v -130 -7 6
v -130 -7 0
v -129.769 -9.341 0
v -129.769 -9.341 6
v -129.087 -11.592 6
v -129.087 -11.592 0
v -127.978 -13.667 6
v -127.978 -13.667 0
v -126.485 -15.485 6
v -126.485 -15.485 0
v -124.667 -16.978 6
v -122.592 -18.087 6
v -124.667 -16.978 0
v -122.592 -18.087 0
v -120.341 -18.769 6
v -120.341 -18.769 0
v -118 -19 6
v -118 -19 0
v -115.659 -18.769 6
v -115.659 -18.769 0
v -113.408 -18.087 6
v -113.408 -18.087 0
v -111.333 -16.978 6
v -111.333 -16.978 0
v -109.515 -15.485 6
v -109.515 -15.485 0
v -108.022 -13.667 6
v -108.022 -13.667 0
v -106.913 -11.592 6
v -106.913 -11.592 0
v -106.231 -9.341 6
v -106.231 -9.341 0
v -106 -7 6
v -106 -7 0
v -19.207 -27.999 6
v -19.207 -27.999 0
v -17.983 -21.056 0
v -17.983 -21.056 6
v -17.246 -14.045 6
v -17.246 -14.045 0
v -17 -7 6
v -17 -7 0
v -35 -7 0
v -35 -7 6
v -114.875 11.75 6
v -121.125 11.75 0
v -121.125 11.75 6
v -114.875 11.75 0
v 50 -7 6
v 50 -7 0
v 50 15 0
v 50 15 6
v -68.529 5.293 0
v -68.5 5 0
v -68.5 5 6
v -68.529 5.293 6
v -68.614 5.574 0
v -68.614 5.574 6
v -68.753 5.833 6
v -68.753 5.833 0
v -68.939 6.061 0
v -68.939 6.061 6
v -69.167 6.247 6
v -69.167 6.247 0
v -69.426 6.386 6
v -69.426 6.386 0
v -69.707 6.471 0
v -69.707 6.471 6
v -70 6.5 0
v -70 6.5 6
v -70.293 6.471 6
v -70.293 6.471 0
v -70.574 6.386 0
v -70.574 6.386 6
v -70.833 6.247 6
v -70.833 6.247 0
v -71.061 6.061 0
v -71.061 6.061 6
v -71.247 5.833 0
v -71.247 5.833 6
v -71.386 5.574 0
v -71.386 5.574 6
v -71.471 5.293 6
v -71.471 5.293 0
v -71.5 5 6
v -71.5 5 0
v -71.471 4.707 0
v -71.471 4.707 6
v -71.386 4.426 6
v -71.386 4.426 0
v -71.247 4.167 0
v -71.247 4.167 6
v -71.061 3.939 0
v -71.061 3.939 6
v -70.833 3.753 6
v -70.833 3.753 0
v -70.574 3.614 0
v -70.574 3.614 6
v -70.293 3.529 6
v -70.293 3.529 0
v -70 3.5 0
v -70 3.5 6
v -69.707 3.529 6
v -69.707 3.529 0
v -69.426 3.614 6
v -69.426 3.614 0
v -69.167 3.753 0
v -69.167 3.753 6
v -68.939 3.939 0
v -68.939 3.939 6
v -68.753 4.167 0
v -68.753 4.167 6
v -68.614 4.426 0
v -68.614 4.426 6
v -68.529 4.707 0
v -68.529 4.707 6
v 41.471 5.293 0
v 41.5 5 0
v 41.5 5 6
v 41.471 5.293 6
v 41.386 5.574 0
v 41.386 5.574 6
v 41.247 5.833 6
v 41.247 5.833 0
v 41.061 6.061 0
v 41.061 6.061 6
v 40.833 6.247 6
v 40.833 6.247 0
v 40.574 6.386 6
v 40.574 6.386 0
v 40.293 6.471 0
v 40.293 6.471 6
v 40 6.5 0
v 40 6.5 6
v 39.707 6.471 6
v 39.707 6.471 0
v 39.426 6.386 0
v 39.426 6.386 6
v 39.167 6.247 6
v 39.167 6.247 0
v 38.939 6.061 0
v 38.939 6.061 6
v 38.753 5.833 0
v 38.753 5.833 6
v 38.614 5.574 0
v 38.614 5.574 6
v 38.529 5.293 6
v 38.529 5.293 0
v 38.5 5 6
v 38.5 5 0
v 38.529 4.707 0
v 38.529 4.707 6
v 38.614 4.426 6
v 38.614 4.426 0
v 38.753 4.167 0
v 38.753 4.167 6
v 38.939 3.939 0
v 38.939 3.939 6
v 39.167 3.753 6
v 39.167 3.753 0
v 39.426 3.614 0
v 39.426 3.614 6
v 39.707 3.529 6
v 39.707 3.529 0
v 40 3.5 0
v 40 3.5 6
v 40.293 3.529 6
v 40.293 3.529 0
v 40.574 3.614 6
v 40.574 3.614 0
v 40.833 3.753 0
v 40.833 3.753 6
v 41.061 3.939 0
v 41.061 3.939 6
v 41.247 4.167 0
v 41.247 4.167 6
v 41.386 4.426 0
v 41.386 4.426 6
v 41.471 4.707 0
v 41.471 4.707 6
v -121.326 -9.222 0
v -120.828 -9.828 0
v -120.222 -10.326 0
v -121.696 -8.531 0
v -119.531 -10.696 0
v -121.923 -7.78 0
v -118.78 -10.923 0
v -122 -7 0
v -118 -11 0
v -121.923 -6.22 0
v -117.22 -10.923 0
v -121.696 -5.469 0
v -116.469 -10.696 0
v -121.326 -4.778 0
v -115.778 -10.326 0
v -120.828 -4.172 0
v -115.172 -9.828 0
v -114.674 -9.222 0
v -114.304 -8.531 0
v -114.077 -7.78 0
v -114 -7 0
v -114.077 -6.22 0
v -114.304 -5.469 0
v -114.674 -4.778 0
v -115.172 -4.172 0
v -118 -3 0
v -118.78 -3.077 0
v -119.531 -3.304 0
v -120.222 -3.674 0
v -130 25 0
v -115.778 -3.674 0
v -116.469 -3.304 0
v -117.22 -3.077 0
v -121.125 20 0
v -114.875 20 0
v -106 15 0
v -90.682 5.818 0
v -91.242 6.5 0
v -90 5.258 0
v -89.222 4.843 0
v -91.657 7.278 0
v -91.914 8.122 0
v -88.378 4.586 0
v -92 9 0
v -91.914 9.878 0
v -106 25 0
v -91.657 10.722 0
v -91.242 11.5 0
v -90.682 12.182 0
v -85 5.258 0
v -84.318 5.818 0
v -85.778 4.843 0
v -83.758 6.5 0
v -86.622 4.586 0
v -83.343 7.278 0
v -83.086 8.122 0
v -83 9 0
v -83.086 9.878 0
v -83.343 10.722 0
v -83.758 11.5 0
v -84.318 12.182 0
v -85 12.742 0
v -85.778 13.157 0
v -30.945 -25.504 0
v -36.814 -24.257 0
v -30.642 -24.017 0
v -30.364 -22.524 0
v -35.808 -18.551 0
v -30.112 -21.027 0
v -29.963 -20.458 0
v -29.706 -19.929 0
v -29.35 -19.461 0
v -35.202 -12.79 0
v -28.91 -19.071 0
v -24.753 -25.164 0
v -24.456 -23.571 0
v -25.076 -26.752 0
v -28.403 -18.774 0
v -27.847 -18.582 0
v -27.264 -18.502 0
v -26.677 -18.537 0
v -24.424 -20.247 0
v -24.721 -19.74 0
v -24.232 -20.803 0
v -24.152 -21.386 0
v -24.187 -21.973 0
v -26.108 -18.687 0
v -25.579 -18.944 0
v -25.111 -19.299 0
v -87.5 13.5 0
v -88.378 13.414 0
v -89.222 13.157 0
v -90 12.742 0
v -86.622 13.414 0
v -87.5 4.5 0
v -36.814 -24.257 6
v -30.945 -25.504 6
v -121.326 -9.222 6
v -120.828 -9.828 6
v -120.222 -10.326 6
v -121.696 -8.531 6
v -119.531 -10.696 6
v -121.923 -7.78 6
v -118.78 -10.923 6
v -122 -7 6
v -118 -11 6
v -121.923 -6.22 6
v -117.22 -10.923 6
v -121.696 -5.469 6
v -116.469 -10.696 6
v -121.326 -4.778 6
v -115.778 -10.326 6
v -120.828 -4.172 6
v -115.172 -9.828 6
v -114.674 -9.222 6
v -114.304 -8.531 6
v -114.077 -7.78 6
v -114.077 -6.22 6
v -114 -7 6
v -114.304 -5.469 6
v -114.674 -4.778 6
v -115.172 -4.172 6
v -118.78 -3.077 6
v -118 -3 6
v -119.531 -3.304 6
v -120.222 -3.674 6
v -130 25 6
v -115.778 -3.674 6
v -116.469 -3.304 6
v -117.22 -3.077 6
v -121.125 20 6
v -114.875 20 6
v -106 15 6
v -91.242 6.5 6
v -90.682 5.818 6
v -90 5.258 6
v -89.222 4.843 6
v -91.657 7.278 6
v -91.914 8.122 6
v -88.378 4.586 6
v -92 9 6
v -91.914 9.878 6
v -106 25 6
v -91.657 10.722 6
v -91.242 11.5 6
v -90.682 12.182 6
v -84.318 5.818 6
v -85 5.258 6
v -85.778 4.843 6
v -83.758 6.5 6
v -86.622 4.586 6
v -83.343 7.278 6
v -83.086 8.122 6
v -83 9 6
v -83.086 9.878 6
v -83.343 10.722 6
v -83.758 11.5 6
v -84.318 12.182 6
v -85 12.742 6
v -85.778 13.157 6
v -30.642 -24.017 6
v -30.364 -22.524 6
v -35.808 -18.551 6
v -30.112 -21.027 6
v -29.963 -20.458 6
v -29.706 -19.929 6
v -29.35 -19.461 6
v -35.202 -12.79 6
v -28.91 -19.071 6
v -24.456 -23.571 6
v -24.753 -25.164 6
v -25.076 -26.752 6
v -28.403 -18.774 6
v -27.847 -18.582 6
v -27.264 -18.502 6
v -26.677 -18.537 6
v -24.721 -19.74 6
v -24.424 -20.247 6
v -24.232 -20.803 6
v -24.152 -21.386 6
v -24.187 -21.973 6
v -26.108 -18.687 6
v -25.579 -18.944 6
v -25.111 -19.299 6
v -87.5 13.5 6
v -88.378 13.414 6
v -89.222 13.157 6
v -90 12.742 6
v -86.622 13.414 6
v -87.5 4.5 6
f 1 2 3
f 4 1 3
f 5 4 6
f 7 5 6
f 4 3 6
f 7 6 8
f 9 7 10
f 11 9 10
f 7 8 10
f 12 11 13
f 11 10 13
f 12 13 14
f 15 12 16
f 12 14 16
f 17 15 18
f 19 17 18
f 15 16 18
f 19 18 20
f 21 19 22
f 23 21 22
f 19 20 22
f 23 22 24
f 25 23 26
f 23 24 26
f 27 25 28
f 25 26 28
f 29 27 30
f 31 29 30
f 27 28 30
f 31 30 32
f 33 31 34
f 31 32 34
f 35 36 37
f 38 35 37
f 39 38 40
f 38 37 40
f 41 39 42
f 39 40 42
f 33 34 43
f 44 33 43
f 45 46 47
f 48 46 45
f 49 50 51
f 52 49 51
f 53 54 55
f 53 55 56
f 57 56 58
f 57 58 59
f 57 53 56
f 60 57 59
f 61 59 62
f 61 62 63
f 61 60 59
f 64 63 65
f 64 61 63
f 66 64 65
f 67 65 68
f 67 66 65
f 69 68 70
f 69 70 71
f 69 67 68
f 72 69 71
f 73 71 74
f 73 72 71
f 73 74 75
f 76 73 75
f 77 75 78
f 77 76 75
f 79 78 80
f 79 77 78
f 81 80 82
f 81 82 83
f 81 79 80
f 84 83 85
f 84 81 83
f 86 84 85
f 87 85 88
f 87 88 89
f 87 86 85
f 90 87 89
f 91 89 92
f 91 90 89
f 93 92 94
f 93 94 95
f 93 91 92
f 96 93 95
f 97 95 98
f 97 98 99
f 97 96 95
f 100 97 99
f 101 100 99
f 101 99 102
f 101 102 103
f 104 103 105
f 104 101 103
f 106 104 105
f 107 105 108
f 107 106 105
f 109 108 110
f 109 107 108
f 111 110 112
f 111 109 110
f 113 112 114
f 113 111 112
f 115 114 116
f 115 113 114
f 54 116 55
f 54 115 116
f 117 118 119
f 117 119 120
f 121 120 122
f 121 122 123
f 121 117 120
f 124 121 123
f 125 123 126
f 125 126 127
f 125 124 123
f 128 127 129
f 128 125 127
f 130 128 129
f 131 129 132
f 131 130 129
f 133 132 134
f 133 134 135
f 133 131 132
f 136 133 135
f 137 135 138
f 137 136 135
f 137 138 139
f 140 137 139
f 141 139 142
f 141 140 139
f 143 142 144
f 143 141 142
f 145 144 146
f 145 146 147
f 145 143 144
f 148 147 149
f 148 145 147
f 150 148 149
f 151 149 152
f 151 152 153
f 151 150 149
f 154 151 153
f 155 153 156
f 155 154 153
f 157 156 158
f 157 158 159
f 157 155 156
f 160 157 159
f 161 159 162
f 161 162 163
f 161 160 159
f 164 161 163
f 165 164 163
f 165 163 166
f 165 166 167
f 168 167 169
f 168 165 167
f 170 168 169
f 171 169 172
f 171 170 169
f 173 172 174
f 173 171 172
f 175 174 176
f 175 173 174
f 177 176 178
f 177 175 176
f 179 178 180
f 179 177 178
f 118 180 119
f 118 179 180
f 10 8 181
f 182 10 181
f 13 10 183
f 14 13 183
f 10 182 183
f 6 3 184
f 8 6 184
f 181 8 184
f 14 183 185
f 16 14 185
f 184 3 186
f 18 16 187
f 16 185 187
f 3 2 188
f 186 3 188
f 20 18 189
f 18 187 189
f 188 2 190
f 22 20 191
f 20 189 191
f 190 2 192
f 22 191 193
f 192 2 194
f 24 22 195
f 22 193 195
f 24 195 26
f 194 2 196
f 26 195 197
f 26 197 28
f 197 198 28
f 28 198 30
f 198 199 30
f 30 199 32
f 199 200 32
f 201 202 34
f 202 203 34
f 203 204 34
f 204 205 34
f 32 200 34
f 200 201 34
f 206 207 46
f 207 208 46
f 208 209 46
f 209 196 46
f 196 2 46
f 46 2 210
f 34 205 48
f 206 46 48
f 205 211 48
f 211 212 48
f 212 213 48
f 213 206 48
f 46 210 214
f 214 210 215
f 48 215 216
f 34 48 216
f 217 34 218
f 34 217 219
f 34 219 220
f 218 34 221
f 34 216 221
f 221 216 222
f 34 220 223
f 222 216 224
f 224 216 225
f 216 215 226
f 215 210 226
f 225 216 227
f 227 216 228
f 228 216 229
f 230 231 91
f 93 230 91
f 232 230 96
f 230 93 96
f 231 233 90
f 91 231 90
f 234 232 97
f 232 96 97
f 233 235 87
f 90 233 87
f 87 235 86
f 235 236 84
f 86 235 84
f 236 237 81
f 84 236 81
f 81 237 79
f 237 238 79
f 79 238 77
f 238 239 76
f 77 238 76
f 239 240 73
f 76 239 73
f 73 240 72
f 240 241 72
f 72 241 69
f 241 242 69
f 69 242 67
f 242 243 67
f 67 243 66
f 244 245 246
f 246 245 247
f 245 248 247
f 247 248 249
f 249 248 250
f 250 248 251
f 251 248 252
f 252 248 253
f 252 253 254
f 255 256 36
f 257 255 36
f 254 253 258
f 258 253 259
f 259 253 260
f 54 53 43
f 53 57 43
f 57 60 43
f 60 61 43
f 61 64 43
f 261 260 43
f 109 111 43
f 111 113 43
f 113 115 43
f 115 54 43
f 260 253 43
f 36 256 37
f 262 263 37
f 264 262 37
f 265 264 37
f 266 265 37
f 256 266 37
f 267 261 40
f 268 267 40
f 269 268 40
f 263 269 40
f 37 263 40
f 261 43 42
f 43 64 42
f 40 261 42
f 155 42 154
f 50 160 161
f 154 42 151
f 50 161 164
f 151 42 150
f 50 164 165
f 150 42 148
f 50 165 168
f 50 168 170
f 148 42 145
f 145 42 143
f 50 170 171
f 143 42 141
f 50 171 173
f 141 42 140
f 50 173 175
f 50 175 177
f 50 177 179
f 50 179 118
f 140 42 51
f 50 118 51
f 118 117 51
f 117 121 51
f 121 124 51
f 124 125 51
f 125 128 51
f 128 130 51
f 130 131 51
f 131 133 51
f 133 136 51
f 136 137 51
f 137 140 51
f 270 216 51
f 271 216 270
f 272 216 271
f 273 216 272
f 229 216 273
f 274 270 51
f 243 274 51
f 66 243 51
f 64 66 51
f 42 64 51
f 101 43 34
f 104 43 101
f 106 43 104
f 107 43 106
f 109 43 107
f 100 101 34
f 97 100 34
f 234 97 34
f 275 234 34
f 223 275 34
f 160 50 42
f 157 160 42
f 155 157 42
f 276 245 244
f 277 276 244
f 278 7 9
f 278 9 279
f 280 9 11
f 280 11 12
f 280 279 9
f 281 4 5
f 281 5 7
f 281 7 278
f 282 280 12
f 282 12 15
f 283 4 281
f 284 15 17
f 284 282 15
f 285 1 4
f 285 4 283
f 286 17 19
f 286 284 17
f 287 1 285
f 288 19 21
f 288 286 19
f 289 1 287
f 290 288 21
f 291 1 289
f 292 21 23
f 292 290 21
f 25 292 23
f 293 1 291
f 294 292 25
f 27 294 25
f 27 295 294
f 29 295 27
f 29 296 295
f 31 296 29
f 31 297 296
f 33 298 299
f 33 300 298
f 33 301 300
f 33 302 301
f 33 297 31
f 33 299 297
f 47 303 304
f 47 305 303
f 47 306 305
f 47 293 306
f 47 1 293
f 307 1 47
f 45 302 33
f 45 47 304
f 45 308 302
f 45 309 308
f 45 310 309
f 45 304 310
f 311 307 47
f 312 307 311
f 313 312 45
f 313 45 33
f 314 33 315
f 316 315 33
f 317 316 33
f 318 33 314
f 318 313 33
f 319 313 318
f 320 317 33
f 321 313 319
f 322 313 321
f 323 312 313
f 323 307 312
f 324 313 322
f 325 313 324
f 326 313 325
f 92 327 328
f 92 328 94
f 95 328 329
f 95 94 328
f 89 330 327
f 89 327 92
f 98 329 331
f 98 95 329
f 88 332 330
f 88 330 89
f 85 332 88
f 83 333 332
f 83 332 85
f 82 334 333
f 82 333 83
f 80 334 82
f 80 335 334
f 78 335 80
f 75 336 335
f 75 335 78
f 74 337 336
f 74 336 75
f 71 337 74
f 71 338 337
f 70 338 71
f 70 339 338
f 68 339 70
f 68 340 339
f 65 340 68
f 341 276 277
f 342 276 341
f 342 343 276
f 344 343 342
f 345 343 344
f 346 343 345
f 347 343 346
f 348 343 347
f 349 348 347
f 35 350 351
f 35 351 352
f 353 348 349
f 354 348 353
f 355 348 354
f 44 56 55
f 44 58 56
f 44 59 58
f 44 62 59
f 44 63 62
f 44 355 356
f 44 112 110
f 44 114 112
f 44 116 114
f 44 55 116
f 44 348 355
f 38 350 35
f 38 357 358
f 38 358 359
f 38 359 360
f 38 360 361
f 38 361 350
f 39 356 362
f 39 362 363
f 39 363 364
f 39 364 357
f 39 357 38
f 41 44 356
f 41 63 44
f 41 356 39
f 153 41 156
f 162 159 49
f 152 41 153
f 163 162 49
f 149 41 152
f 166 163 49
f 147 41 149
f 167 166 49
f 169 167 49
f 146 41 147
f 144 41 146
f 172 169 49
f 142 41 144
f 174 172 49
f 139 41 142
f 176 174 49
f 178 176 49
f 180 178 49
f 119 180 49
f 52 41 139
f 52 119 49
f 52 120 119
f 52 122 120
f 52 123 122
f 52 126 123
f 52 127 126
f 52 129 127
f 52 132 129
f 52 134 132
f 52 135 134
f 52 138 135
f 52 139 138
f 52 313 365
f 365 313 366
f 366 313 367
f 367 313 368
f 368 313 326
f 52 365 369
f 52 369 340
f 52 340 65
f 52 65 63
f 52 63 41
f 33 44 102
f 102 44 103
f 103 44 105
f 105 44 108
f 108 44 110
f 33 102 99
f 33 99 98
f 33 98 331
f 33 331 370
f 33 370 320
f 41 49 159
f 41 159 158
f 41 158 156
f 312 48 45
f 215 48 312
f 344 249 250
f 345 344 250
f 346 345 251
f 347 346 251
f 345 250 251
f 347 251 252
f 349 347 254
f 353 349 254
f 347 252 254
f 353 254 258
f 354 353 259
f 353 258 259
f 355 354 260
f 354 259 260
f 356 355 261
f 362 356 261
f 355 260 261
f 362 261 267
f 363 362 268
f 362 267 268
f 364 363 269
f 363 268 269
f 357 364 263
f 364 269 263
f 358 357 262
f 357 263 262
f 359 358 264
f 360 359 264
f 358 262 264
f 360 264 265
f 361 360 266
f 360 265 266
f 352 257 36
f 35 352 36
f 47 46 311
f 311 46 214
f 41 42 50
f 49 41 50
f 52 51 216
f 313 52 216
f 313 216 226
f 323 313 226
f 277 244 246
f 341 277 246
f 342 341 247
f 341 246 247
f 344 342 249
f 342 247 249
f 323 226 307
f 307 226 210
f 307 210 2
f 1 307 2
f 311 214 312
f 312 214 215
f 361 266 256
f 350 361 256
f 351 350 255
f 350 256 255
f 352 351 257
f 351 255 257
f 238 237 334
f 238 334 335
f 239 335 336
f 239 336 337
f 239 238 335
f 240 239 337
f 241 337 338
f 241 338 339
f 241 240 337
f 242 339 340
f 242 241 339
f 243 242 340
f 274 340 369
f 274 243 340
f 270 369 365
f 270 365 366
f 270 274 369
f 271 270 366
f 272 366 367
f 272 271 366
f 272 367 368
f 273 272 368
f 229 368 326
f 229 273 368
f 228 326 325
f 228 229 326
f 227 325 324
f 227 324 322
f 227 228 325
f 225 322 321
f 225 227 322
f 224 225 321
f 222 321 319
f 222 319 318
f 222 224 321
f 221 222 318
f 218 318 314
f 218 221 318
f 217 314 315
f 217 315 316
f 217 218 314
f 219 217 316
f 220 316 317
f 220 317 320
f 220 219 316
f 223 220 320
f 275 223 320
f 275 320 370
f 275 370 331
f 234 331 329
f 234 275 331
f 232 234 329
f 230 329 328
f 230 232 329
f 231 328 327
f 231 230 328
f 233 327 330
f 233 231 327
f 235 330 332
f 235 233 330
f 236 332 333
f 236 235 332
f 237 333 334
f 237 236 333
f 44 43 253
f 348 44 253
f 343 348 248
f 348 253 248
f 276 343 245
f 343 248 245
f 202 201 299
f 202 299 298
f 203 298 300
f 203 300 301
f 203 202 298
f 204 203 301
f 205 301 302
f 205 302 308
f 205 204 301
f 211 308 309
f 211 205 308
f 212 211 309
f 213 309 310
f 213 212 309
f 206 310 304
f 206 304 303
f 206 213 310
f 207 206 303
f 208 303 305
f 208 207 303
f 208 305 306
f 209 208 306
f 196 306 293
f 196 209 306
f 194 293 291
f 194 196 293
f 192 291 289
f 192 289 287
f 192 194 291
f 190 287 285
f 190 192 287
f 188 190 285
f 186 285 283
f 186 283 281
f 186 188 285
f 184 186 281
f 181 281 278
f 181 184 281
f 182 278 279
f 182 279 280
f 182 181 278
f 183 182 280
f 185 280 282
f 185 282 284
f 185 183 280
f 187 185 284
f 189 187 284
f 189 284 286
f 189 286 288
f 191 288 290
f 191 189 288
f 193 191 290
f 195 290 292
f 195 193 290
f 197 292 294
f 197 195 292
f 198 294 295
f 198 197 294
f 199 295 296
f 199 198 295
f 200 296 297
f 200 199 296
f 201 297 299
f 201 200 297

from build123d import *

# Parameters (mm, degrees)
ESBO_O1_R                = 4
ESBO_O1_R_2              = 1.5
ESBO_O1_R_3              = 4.5
ESBO_O1_W                = 6.25
ESBO_O1_H                = 8.25
RESSALTO_EXTRUS_O1_DEPTH = 6


with BuildPart() as part:
    # Esboço1 → Ressalto-extrusão1 (new body)
    with BuildSketch(Plane.XY):
        with BuildLine():
            Line((50, -7), (50, 15))
            Line((50, 15), (-106, 15))
            Line((-106, 15), (-106, 25))
            Line((-106, 25), (-130, 25))
            Line((-130, 25), (-130, -7))
            ThreePointArc((-130, -7), (-118, -19), (-106, -7))
            Line((-106, -7), (-35, -7))
            ThreePointArc((-35, -7), (-35.454682684, -15.675862451), (-36.813749139, -24.256670338))
            Line((-36.813749139, -24.256670338), (-30.944863535, -25.504140483))
            ThreePointArc((-30.944863535, -25.504140483), (-30.499970699, -23.270982524), (-30.112353587, -21.027173913))
            ThreePointArc((-30.112353587, -21.027173913), (-26.677022565, -18.537495065), (-24.187343716, -21.972826087))
            ThreePointArc((-24.187343716, -21.972826087), (-24.601092319, -24.367902694), (-25.07597793, -26.751610628))
            Line((-25.07597793, -26.751610628), (-19.207092326, -27.999080773))
            ThreePointArc((-19.207092326, -27.999080773), (-17.553288568, -17.55737479), (-17, -7))
            Line((-17, -7), (50, -7))
        make_face()
        with Locations((-118, -7)):
            Circle(ESBO_O1_R, mode=Mode.SUBTRACT)
        with Locations((-70, 5)):
            Circle(ESBO_O1_R_2, mode=Mode.SUBTRACT)
        with Locations((40, 5)):
            Circle(ESBO_O1_R_2, mode=Mode.SUBTRACT)
        with Locations((-87.5, 9)):
            Circle(ESBO_O1_R_3, mode=Mode.SUBTRACT)
        with Locations((-118, 15.875)):
            Rectangle(ESBO_O1_W, ESBO_O1_H, mode=Mode.SUBTRACT)
    extrude(amount=RESSALTO_EXTRUS_O1_DEPTH)


solid = part.part
